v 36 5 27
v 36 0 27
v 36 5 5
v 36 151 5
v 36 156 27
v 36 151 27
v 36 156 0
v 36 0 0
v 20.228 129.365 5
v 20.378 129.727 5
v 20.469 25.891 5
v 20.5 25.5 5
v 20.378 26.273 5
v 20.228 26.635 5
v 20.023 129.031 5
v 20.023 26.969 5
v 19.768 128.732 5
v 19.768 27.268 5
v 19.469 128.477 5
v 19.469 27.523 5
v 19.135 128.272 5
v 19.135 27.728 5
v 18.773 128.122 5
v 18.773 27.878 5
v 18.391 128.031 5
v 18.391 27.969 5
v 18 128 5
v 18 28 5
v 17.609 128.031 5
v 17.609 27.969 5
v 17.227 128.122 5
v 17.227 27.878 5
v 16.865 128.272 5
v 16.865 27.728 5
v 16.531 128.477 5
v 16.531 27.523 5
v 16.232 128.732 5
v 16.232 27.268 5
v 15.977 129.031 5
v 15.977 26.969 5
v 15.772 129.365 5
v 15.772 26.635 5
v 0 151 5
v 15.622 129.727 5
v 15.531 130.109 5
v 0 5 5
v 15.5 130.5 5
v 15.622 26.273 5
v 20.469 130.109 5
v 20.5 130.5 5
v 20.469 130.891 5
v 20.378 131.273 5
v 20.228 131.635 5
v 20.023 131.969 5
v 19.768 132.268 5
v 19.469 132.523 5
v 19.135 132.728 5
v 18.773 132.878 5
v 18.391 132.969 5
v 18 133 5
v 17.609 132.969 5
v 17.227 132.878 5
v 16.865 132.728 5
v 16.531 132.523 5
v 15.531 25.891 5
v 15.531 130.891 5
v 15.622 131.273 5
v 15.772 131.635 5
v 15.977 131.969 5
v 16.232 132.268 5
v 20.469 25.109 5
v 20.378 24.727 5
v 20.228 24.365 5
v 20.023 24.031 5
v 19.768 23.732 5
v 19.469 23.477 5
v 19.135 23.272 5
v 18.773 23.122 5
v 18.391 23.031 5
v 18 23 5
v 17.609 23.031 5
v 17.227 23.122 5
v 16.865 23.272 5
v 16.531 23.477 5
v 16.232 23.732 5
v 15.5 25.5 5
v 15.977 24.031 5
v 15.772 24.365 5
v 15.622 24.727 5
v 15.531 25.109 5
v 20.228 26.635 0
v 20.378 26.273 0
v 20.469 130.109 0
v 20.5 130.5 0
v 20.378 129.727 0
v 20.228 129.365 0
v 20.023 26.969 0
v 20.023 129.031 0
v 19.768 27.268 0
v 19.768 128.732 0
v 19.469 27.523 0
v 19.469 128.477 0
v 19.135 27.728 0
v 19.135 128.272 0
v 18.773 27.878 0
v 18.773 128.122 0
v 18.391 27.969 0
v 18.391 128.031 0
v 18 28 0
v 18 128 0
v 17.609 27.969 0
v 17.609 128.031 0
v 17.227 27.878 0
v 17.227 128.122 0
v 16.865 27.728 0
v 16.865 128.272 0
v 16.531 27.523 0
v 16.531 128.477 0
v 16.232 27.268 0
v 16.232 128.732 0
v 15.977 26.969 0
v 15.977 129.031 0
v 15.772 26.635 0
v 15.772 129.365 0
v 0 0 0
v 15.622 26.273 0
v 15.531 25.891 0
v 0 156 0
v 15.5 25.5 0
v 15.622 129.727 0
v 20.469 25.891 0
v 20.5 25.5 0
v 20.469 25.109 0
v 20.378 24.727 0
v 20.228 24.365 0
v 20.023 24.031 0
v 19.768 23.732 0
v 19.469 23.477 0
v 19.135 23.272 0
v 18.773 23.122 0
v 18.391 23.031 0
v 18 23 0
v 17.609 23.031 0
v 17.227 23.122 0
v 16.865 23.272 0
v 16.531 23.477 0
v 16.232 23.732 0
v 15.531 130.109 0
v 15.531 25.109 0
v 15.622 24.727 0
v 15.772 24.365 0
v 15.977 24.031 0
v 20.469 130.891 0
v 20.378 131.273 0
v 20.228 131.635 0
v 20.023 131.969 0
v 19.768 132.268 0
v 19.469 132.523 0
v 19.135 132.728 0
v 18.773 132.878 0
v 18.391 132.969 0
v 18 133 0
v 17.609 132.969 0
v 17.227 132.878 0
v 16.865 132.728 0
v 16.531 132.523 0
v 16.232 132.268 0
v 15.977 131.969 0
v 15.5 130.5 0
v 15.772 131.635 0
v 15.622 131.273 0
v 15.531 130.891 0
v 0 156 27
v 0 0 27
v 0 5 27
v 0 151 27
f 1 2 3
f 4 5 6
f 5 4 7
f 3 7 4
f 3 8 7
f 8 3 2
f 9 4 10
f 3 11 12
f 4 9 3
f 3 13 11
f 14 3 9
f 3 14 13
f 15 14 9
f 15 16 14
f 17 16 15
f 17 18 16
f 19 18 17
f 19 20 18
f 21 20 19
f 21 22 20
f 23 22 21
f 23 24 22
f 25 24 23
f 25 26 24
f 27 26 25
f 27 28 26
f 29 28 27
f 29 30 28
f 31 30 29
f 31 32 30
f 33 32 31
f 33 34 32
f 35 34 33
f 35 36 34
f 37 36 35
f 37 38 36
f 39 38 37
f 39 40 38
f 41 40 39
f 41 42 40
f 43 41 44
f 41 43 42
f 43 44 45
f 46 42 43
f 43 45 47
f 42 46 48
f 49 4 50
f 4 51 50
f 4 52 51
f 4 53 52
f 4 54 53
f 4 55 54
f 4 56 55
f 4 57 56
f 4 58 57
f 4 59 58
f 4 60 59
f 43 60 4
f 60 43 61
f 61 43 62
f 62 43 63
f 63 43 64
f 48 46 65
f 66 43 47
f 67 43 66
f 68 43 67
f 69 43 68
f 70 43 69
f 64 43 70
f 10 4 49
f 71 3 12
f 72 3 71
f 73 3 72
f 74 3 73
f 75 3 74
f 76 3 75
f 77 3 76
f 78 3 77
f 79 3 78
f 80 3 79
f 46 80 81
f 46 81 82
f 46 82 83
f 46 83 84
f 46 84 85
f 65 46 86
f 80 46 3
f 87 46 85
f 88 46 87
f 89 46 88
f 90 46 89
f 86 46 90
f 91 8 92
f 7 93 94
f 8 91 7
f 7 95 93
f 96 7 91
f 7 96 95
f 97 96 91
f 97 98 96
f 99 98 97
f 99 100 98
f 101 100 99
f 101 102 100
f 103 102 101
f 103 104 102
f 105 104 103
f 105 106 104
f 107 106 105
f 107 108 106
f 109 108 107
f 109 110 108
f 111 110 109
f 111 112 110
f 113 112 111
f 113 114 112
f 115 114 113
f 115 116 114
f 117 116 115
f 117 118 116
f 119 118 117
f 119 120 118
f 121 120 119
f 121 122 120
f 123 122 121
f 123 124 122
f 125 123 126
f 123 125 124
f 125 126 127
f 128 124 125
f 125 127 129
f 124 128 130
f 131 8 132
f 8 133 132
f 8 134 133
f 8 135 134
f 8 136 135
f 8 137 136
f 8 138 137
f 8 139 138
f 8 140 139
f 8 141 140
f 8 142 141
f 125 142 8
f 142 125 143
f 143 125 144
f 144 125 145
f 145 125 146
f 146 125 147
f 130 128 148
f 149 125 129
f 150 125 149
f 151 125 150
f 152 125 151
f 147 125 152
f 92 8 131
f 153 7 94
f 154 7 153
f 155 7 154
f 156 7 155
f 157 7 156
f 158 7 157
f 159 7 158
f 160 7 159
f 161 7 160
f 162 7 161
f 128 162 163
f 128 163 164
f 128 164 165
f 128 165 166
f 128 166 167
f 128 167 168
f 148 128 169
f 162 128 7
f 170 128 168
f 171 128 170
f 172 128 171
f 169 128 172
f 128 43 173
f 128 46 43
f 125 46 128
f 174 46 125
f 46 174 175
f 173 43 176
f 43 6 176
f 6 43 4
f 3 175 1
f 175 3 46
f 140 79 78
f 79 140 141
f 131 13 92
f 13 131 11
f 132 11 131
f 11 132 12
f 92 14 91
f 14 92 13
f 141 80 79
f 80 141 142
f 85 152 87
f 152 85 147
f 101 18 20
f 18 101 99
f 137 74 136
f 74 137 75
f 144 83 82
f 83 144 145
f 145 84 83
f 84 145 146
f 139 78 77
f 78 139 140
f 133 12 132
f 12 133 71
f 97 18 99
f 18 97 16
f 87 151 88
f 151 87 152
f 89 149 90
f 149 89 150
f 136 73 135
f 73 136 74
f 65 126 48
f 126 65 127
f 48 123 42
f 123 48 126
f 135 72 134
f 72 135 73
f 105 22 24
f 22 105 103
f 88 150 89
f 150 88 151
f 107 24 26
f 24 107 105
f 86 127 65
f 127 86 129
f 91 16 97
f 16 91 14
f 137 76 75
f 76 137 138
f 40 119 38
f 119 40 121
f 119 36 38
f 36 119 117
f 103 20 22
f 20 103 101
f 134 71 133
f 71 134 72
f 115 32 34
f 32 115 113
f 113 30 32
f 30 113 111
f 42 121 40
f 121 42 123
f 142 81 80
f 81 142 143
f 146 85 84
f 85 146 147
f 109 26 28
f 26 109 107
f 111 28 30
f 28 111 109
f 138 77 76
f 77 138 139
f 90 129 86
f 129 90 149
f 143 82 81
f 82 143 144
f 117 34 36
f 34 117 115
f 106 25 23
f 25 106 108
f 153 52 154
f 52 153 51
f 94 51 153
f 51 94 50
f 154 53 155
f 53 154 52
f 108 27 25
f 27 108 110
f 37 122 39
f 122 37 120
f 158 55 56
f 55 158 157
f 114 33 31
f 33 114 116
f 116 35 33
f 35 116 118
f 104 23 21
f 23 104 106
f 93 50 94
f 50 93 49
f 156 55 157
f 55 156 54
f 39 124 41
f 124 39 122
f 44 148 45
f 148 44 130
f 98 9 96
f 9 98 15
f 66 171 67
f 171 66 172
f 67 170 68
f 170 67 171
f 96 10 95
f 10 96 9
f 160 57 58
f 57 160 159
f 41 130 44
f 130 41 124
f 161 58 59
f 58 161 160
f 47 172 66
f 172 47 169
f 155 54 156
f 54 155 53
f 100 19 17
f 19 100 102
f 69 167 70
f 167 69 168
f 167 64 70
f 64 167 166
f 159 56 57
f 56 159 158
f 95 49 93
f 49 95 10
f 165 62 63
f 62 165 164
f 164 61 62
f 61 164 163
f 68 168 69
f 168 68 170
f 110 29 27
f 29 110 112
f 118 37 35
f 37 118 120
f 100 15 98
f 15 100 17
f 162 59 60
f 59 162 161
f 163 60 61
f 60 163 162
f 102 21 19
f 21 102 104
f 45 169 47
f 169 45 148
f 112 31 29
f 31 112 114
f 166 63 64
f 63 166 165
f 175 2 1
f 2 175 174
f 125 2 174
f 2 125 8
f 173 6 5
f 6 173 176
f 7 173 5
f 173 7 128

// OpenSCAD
DECKING_WIDTH = 146;
DECKING_HEIGHT = 27;
DECKING_SPACING = 5;

HOLE_SPACING = 105;
HOLE_OFFSET_FROM_SIDE = 18;
HOLE_DIAMETER = 5;

WASHER_DIAMETER = 15;
WASHER_THICKNESS = 2;

GUIDE_THICKNESS = 5;
GUIDE_WIDTH = 40;

$fn = 40;
translate([0, DECKING_SPACING, 0])
difference() {
    cube([HOLE_OFFSET_FROM_SIDE * 2, DECKING_WIDTH, GUIDE_THICKNESS]);
    translate([HOLE_OFFSET_FROM_SIDE, DECKING_WIDTH/2 - HOLE_SPACING/2, 0]) cylinder(d = HOLE_DIAMETER, h = GUIDE_THICKNESS);
    translate([HOLE_OFFSET_FROM_SIDE, DECKING_WIDTH/2 + HOLE_SPACING/2, 0]) cylinder(d = HOLE_DIAMETER, h = GUIDE_THICKNESS);
}

cube([HOLE_OFFSET_FROM_SIDE * 2, DECKING_SPACING, DECKING_HEIGHT]);
translate([0, DECKING_WIDTH + DECKING_SPACING, 0]) cube([HOLE_OFFSET_FROM_SIDE * 2, DECKING_SPACING, DECKING_HEIGHT]);
